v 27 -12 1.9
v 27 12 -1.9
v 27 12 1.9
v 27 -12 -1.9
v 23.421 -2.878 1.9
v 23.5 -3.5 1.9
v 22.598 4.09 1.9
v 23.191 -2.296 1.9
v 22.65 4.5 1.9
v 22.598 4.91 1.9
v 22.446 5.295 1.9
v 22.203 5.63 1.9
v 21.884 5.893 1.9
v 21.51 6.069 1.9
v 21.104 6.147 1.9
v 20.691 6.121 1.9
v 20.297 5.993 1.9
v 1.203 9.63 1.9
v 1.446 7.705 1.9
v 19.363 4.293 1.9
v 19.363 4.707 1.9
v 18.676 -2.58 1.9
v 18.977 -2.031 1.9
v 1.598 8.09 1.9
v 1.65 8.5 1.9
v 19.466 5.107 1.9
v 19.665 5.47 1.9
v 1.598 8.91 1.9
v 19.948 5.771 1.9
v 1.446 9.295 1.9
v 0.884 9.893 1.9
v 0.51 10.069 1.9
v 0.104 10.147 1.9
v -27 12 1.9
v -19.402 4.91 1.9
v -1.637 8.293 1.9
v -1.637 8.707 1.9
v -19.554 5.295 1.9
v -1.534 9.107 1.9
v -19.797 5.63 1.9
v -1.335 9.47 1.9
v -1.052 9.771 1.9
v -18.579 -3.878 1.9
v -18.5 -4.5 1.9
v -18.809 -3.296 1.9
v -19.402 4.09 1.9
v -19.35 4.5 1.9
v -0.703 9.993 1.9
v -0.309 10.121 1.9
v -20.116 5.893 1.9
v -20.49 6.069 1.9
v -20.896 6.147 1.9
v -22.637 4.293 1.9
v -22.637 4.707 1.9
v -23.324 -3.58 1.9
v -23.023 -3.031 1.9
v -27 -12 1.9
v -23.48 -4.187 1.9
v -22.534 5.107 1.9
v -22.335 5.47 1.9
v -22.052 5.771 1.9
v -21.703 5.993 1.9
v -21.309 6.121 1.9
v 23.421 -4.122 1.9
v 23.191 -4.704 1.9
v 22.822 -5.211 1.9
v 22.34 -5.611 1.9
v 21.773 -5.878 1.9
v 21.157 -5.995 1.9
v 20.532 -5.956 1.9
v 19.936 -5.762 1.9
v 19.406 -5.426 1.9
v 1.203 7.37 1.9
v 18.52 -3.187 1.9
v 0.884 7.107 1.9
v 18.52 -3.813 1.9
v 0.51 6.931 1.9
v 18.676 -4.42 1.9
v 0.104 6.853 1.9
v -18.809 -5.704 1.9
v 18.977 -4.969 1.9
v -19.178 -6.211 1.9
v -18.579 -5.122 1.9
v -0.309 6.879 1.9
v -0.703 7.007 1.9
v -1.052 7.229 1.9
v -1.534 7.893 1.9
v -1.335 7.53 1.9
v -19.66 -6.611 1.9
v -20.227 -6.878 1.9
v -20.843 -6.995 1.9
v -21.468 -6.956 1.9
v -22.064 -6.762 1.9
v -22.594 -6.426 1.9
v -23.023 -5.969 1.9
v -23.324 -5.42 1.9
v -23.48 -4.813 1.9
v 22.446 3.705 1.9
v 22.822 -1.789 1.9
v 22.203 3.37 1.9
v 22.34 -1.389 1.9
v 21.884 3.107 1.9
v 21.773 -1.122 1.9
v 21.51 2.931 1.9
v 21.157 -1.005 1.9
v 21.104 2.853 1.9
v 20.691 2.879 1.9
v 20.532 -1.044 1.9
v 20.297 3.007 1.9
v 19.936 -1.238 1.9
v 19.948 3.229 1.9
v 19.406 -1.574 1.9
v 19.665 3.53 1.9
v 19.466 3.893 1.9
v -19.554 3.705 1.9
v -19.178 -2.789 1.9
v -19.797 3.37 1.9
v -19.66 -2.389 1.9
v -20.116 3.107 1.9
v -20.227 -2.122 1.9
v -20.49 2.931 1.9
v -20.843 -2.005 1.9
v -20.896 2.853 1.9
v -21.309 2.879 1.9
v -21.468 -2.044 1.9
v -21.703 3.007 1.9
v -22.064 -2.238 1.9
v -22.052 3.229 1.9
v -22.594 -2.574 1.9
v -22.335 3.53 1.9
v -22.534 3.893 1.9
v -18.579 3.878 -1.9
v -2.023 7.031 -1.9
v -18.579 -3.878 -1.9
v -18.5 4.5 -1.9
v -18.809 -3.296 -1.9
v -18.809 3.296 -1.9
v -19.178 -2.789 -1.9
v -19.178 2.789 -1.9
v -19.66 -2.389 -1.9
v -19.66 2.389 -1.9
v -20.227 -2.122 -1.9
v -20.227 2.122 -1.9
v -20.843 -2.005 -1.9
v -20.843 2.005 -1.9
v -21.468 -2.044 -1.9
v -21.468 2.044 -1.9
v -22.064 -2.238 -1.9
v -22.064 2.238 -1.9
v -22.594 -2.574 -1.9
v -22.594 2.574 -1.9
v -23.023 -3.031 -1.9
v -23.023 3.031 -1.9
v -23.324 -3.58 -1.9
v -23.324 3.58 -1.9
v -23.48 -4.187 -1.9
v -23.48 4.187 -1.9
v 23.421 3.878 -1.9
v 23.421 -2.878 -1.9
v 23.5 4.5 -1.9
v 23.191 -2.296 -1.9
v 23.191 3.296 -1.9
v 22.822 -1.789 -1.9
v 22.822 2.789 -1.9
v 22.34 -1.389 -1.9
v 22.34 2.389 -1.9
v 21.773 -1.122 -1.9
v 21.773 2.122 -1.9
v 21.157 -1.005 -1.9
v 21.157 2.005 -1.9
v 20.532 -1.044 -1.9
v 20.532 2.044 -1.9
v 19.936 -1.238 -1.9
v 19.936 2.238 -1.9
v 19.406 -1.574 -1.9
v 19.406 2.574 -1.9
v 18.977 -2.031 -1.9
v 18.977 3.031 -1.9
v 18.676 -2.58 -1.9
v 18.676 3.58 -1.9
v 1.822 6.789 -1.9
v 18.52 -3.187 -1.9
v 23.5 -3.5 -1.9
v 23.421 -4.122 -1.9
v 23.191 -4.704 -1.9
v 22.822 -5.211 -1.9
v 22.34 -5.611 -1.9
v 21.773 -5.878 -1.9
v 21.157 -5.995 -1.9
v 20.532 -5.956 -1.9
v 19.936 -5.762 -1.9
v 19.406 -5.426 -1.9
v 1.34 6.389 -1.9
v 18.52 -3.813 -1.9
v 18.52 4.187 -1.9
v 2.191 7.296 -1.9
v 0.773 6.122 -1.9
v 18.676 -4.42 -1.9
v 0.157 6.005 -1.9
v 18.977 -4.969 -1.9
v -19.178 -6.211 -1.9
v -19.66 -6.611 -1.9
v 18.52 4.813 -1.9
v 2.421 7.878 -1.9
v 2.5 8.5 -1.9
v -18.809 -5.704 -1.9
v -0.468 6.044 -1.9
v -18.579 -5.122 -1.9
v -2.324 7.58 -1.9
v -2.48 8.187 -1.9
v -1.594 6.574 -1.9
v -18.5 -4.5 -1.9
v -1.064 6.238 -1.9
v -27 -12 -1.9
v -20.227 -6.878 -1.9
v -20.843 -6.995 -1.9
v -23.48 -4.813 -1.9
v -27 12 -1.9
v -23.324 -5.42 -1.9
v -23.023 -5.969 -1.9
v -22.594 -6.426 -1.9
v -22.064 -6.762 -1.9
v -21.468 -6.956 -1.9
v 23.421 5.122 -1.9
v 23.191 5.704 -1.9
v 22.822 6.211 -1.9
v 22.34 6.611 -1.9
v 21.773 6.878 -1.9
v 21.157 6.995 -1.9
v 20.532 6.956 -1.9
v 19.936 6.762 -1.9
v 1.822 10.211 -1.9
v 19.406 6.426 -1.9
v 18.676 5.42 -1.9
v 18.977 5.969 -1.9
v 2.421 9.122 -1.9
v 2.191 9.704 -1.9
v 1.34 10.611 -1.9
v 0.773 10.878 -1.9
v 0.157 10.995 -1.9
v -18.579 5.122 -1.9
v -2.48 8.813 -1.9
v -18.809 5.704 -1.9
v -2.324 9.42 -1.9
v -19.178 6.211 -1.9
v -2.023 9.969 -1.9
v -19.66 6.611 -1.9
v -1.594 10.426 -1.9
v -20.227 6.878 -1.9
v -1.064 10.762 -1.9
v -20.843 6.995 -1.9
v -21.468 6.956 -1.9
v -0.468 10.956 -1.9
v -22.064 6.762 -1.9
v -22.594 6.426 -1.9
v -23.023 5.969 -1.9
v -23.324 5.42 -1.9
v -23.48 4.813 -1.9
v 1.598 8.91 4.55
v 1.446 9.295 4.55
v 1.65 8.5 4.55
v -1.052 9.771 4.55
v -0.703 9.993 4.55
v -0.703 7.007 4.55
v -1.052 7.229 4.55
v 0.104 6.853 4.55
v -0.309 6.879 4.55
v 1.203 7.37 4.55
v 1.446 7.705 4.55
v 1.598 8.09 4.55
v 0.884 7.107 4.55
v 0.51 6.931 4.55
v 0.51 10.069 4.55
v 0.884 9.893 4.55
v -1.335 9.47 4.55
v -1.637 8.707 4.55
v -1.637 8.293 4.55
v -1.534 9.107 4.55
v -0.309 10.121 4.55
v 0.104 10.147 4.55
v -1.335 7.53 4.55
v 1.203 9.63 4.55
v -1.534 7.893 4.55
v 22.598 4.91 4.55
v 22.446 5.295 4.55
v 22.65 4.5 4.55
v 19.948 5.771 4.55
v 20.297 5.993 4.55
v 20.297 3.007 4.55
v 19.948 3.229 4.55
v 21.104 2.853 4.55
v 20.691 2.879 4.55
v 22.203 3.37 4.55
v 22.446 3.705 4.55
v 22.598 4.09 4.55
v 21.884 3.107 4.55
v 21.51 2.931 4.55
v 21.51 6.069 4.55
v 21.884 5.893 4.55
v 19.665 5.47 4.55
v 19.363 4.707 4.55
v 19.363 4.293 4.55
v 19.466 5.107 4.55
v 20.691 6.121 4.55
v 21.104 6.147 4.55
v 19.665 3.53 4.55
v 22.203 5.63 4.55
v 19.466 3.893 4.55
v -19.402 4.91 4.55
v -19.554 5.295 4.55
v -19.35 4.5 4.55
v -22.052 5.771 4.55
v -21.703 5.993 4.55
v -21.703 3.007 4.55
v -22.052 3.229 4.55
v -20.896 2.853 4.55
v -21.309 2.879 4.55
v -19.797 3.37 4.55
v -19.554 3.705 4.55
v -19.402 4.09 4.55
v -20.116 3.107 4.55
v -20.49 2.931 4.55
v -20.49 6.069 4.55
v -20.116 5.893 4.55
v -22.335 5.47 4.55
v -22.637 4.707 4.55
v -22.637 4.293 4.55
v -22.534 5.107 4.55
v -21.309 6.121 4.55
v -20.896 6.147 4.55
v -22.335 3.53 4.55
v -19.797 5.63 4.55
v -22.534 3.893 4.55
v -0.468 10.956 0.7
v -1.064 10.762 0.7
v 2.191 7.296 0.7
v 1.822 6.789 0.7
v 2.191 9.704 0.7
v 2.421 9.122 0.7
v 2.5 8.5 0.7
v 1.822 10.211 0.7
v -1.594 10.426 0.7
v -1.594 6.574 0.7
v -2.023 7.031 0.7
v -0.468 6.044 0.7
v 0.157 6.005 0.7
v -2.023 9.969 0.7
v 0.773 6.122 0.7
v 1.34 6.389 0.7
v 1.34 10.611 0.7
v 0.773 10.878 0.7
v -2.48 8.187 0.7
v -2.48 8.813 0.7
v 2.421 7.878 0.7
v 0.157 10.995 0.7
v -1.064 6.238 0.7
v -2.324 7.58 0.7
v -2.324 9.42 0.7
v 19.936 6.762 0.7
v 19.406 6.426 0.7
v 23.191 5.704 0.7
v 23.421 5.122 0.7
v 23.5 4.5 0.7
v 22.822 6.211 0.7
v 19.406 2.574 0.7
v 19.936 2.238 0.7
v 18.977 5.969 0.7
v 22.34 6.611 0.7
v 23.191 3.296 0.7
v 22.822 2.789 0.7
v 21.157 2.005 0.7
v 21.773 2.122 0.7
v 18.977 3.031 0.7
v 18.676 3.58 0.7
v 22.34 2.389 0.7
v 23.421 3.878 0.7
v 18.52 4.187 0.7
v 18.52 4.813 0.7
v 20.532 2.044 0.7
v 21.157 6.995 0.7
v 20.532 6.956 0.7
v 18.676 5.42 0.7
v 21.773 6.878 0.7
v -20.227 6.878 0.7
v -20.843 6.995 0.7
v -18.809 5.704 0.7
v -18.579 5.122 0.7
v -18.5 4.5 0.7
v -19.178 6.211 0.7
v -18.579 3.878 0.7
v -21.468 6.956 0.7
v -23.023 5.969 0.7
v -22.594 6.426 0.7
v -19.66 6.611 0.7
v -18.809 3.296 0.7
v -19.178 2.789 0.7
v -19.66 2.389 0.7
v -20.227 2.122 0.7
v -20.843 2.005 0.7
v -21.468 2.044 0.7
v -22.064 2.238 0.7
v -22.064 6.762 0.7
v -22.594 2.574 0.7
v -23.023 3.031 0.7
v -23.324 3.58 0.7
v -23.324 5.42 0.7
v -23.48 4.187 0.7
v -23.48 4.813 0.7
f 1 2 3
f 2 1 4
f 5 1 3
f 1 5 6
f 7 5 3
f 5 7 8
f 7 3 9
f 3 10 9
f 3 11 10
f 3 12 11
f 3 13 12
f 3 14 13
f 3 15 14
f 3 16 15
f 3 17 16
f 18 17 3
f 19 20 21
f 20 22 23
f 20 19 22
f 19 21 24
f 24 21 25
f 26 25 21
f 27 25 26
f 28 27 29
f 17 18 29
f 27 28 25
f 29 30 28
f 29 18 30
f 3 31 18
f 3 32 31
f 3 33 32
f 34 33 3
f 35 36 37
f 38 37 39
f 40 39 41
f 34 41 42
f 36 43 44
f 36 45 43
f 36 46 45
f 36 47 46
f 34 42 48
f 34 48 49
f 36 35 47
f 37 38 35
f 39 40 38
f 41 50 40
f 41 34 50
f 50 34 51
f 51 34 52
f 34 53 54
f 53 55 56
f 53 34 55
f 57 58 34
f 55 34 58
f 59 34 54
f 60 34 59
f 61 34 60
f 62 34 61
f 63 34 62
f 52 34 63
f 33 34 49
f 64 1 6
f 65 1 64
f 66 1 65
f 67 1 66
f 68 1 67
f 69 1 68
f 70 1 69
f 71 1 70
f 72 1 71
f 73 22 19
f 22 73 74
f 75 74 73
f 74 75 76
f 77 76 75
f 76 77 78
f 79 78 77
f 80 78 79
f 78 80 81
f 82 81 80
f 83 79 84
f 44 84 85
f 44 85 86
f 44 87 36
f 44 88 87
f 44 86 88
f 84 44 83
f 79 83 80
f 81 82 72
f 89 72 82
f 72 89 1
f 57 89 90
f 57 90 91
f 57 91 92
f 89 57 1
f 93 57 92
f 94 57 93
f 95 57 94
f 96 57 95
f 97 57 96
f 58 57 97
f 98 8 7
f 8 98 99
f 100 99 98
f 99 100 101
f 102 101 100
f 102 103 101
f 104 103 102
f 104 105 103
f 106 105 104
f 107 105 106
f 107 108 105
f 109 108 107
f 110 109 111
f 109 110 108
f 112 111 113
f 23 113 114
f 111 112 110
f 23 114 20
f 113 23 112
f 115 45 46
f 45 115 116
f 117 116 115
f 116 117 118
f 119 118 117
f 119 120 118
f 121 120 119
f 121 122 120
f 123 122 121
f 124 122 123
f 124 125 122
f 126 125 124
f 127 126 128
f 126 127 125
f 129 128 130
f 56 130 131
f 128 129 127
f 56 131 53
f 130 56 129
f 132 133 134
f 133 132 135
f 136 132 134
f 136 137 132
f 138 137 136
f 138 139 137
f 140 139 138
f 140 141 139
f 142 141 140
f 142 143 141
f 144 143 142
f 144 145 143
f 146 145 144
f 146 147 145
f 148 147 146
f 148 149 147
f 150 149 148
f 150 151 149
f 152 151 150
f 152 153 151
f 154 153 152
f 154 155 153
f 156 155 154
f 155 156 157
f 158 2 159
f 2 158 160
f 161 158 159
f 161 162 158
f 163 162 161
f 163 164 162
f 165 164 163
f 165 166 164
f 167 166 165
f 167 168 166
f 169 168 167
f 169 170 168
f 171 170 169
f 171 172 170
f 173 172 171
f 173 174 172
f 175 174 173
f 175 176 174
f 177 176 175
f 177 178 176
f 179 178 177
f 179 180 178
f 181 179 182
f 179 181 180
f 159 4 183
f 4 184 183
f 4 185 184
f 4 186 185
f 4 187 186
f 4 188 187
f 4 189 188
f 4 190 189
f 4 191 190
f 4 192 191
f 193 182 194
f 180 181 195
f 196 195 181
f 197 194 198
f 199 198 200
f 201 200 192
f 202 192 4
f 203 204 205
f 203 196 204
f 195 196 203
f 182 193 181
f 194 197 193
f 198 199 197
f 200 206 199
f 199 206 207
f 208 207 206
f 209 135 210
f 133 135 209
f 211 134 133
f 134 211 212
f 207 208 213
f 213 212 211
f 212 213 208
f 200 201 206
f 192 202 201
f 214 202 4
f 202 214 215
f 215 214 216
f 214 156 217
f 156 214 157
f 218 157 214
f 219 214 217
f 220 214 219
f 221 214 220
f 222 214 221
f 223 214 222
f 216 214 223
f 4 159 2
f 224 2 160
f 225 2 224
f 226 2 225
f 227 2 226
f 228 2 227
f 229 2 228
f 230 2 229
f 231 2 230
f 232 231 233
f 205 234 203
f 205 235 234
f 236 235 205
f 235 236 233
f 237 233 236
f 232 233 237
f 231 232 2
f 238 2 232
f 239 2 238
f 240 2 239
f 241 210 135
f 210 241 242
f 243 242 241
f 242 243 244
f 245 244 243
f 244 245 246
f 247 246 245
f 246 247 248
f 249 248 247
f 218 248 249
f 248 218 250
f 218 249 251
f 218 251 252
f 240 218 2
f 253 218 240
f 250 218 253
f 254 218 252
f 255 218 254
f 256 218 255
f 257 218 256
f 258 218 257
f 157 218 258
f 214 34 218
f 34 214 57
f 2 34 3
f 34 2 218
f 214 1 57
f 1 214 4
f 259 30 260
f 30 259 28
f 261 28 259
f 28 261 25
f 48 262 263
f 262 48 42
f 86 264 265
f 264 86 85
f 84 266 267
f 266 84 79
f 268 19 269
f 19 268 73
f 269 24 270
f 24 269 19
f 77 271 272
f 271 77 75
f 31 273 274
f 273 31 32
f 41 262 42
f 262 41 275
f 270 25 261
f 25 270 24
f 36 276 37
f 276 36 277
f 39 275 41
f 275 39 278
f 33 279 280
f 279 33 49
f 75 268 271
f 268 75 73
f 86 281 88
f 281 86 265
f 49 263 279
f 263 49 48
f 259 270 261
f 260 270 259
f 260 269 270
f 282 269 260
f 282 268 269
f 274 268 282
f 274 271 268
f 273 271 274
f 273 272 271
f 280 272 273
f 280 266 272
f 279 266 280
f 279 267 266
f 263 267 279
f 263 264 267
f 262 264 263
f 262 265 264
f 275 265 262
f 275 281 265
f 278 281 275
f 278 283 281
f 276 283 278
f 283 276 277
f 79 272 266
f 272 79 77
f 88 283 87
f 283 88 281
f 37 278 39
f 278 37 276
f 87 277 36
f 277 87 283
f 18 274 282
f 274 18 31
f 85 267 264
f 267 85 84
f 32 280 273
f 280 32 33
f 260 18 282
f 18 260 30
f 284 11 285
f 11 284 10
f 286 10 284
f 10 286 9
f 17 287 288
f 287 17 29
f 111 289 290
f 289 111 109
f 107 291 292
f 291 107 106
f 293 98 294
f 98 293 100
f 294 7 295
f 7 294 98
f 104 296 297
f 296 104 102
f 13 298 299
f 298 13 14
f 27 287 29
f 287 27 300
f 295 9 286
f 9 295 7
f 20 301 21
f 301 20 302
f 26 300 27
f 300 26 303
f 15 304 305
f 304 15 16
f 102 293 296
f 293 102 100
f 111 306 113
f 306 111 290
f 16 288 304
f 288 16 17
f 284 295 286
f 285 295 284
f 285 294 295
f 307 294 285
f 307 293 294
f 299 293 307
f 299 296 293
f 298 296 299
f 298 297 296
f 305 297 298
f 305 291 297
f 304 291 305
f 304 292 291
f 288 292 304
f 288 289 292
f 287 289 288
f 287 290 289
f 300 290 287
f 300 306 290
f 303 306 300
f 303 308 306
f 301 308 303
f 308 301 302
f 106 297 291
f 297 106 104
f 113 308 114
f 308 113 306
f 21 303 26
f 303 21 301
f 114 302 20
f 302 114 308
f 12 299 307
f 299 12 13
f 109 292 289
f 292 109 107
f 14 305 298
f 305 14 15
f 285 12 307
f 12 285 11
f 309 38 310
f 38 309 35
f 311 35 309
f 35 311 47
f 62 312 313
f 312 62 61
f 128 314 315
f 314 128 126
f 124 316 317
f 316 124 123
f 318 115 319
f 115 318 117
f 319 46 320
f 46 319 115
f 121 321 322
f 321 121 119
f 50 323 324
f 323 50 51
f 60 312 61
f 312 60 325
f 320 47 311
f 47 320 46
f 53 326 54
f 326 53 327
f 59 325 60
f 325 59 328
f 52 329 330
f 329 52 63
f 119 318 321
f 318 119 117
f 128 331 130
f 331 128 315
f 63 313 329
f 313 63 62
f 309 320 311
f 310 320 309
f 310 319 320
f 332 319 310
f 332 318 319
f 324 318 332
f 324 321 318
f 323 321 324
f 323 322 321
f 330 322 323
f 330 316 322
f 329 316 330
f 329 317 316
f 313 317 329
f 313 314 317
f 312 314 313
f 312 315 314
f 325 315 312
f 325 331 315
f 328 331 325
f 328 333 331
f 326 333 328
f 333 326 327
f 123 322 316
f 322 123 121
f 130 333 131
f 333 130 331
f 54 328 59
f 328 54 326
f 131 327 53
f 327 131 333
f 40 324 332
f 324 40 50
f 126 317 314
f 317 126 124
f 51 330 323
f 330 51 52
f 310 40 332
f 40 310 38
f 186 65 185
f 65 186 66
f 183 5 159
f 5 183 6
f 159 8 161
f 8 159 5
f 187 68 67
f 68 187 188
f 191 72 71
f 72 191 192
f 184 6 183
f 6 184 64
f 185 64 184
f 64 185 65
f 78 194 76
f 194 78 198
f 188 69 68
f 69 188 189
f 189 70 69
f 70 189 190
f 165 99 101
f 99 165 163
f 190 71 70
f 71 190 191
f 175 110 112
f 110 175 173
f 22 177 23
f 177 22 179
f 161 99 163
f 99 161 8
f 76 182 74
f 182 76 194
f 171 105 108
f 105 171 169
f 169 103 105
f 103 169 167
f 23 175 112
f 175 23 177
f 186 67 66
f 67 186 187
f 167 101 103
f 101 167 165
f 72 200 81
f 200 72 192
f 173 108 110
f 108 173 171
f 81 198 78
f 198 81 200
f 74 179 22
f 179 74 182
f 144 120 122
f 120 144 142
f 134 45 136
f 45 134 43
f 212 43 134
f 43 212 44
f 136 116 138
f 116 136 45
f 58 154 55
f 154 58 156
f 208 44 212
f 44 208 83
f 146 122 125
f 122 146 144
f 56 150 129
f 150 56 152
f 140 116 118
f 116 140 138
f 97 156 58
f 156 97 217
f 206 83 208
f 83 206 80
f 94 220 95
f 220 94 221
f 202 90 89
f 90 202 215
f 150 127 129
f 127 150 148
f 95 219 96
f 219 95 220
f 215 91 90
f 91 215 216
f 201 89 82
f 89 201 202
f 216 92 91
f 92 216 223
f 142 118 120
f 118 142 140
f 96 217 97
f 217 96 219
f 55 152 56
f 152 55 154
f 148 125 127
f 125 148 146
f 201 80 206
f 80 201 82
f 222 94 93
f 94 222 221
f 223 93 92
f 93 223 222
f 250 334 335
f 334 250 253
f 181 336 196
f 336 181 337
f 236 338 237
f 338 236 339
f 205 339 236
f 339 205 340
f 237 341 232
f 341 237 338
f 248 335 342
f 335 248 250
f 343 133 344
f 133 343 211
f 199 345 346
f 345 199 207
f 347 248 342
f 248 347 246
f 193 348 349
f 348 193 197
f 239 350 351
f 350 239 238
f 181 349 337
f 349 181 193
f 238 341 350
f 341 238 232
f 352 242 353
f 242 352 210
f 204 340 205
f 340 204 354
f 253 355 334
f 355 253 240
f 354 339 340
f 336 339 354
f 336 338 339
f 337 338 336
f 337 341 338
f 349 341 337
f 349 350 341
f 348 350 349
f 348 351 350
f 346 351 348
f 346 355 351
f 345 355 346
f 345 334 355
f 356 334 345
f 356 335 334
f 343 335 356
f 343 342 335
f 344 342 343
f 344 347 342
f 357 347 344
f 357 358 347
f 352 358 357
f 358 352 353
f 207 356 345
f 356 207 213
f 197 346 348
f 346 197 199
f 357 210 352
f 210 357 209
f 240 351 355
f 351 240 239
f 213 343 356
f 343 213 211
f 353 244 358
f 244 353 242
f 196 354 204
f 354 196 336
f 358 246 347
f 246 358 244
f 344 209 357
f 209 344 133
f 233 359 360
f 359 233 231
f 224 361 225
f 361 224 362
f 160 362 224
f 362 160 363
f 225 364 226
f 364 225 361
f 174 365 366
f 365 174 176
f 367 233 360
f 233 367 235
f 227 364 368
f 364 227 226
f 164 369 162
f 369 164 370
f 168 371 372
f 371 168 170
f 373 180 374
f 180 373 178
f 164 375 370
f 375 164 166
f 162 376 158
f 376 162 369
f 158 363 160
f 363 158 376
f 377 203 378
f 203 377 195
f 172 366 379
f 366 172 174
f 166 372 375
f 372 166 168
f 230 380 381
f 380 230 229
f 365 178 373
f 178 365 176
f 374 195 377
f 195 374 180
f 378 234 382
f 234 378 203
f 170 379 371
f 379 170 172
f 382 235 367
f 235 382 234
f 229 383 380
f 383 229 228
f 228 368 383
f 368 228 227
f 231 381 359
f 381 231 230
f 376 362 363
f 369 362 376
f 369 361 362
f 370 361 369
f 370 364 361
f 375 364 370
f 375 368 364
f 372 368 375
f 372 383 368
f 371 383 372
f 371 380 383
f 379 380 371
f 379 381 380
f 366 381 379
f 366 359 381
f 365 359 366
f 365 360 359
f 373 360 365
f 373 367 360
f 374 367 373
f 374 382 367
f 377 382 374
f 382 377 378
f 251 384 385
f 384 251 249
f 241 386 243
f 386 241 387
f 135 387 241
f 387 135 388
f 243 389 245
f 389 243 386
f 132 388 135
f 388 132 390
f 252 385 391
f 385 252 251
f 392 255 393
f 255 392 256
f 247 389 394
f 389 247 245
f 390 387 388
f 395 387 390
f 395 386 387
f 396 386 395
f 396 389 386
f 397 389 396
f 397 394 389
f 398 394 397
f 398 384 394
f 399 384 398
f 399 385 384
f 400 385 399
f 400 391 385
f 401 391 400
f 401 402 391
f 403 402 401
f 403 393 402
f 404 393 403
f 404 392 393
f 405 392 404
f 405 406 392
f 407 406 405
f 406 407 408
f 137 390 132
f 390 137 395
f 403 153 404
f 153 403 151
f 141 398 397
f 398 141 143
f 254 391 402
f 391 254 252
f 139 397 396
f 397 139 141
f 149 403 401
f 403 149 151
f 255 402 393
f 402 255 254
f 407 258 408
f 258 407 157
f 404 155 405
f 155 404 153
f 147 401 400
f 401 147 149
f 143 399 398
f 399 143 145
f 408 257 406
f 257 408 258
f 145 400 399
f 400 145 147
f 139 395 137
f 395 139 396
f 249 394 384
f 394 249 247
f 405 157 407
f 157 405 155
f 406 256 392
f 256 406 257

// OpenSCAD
$fn=25;

difference()
{
  union()
  {
    translate([0,0,0]) cube([54,24,3.8],center=true);
    translate([0,8.5,1.9+1.3]) cylinder(h=2.7,r1=3.3/2,r2=3.3/2,center=true);
    translate([21,4.5,1.9+1.3]) cylinder(h=2.7,r1=3.3/2,r2=3.3/2,center=true);
    translate([-21,4.5,1.9+1.3]) cylinder(h=2.7,r1=3.3/2,r2=3.3/2,center=true);
  }
  translate([21,-3.5,0]) cylinder(h=10,r1=5/2,r2=5/2,center=true);
  translate([-21,-4.5,0]) cylinder(h=10,r1=5/2,r2=5/2,center=true);
  translate([0,8.5,-1.9]) cylinder(h=2.6*2,r1=5/2,r2=5/2,center=true);
  translate([21,4.5,-1.9]) cylinder(h=2.6*2,r1=5/2,r2=5/2,center=true);
  translate([-21,4.5,-1.9]) cylinder(h=2.6*2,r1=5/2,r2=5/2,center=true);
}
